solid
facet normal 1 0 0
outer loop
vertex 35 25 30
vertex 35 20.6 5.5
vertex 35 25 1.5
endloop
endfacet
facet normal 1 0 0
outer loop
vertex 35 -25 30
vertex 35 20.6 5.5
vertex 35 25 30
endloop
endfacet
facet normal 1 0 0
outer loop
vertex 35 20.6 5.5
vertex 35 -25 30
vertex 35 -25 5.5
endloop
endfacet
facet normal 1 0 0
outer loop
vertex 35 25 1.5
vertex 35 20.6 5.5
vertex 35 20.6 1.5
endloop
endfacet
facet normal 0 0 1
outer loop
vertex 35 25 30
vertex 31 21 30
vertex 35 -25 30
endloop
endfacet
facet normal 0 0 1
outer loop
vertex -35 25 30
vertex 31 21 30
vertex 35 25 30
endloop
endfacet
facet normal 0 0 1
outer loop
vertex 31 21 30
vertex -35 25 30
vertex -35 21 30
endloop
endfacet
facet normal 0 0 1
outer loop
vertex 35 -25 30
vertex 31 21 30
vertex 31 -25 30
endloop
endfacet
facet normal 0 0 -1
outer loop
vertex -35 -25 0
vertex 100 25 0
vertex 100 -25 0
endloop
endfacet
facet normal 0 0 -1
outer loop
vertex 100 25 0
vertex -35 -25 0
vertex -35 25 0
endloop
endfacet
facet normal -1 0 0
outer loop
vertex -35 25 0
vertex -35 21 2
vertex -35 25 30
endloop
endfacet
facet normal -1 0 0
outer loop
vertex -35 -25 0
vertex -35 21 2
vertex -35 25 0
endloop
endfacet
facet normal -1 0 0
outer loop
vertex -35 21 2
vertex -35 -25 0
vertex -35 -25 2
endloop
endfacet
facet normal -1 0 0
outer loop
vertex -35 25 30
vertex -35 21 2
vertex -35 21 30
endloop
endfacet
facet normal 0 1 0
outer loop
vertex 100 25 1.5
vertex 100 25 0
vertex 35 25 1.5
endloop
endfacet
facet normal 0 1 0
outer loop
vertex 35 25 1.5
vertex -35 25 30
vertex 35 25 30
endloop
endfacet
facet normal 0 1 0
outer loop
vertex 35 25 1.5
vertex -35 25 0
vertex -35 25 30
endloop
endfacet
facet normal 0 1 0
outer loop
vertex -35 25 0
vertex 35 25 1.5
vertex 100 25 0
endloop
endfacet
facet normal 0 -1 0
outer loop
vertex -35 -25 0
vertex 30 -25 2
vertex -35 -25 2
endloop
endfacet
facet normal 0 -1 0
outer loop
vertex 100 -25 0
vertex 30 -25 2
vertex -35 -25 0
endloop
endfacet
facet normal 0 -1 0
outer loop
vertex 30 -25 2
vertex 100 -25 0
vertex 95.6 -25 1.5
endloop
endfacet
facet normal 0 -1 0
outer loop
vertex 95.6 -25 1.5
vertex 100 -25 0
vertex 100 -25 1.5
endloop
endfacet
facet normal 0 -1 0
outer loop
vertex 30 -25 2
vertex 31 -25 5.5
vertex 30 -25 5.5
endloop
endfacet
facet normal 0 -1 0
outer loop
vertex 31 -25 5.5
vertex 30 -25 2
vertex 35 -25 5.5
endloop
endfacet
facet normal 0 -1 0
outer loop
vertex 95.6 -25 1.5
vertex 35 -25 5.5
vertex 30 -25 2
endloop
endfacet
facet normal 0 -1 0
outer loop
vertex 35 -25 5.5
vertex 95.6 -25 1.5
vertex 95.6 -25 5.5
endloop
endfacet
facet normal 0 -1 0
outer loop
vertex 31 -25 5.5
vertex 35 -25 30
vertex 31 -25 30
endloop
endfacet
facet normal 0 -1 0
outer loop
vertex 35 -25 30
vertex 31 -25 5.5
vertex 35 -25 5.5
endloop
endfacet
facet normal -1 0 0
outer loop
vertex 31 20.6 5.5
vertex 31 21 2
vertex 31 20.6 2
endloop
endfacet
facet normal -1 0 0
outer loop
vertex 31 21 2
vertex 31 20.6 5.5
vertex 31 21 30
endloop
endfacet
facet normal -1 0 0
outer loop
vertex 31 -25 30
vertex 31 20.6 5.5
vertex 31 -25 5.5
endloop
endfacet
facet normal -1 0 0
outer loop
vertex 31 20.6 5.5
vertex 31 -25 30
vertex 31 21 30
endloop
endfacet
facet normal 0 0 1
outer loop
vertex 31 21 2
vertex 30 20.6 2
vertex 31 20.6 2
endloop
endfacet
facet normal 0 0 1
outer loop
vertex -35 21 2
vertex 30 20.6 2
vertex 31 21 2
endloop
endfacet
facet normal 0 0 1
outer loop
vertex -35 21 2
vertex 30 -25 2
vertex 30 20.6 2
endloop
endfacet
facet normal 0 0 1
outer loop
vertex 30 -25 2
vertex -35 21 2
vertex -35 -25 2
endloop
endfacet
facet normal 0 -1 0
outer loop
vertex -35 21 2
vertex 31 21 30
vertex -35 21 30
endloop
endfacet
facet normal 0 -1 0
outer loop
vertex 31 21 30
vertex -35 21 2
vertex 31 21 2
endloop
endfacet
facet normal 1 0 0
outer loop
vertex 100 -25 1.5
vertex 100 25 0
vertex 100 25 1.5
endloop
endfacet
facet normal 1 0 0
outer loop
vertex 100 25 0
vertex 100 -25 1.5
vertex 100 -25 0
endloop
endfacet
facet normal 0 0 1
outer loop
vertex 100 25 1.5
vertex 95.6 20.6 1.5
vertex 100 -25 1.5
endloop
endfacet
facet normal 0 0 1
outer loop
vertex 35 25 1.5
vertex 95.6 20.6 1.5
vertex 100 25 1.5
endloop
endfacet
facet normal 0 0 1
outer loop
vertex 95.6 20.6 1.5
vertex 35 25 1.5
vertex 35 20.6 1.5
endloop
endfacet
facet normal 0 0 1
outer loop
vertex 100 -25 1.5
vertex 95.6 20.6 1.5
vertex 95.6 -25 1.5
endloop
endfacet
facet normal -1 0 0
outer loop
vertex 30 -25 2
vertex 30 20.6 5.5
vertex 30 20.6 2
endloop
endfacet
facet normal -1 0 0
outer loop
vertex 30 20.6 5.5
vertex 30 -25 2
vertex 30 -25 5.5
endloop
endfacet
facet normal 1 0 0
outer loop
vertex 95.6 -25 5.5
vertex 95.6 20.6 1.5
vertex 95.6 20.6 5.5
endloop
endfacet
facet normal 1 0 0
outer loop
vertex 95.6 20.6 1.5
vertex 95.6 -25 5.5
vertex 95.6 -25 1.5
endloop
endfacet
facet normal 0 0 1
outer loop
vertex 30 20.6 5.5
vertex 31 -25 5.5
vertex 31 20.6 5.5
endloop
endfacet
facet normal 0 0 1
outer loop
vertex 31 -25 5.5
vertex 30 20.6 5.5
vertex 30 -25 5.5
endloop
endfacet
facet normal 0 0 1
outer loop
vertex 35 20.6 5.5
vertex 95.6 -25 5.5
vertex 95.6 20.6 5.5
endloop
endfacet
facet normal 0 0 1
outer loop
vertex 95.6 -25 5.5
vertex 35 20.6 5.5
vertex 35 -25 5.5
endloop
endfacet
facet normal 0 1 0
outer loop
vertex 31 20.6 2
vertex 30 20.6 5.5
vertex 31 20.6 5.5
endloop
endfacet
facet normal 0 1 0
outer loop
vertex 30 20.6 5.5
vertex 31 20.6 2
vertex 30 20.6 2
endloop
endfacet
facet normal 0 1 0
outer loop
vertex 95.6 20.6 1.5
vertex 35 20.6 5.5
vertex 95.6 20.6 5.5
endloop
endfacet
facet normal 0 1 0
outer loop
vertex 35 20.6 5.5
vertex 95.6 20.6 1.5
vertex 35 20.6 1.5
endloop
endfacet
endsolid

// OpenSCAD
// Two-part enclosure for small electronics board
// Print orientation: box upright, lid upside down (lip on top)

// ---- Parameters ----
box_x      = 70;    // box outer length (X)
box_y      = 50;    // box outer width (Y)
box_z      = 30;    // box outer height (Z)
box_w      = 2;     // box wall thickness
box_floor  = 2;     // box floor thickness
gap        = 10;    // gap between box and lid
lip_t      = 1.5;   // lid lip thickness (wall)
lip_h      = 4;     // lid lip height
eps        = 0.5;   // cutter overshoot

$fn = 64;

// ---- Derived ----
box_id_x = box_x - 2*box_w;   // inner length
box_id_y = box_y - 2*box_w;   // inner width
lip_o_x  = box_id_x - 0.4;    // lip outer length (0.2 clearance each side)
lip_o_y  = box_id_y - 0.4;    // lip outer width

// ---- Model ----
union() {
    // Box
    translate([-box_x/2, -box_y/2, 0])
        difference() {
            cube([box_x, box_y, box_z]);
            translate([0, 0, box_floor])
                cube([box_id_x, box_id_y, box_z - box_floor + eps]);
        }

    // Lid (upside down)
    translate([(box_x - gap)/2, -box_y/2, 0])
        union() {
            // Plate
            cube([box_x, box_y, lip_t]);
            // Lip
            translate([0, 0, lip_t])
                cube([lip_o_x, lip_o_y, lip_h]);
        }
}
